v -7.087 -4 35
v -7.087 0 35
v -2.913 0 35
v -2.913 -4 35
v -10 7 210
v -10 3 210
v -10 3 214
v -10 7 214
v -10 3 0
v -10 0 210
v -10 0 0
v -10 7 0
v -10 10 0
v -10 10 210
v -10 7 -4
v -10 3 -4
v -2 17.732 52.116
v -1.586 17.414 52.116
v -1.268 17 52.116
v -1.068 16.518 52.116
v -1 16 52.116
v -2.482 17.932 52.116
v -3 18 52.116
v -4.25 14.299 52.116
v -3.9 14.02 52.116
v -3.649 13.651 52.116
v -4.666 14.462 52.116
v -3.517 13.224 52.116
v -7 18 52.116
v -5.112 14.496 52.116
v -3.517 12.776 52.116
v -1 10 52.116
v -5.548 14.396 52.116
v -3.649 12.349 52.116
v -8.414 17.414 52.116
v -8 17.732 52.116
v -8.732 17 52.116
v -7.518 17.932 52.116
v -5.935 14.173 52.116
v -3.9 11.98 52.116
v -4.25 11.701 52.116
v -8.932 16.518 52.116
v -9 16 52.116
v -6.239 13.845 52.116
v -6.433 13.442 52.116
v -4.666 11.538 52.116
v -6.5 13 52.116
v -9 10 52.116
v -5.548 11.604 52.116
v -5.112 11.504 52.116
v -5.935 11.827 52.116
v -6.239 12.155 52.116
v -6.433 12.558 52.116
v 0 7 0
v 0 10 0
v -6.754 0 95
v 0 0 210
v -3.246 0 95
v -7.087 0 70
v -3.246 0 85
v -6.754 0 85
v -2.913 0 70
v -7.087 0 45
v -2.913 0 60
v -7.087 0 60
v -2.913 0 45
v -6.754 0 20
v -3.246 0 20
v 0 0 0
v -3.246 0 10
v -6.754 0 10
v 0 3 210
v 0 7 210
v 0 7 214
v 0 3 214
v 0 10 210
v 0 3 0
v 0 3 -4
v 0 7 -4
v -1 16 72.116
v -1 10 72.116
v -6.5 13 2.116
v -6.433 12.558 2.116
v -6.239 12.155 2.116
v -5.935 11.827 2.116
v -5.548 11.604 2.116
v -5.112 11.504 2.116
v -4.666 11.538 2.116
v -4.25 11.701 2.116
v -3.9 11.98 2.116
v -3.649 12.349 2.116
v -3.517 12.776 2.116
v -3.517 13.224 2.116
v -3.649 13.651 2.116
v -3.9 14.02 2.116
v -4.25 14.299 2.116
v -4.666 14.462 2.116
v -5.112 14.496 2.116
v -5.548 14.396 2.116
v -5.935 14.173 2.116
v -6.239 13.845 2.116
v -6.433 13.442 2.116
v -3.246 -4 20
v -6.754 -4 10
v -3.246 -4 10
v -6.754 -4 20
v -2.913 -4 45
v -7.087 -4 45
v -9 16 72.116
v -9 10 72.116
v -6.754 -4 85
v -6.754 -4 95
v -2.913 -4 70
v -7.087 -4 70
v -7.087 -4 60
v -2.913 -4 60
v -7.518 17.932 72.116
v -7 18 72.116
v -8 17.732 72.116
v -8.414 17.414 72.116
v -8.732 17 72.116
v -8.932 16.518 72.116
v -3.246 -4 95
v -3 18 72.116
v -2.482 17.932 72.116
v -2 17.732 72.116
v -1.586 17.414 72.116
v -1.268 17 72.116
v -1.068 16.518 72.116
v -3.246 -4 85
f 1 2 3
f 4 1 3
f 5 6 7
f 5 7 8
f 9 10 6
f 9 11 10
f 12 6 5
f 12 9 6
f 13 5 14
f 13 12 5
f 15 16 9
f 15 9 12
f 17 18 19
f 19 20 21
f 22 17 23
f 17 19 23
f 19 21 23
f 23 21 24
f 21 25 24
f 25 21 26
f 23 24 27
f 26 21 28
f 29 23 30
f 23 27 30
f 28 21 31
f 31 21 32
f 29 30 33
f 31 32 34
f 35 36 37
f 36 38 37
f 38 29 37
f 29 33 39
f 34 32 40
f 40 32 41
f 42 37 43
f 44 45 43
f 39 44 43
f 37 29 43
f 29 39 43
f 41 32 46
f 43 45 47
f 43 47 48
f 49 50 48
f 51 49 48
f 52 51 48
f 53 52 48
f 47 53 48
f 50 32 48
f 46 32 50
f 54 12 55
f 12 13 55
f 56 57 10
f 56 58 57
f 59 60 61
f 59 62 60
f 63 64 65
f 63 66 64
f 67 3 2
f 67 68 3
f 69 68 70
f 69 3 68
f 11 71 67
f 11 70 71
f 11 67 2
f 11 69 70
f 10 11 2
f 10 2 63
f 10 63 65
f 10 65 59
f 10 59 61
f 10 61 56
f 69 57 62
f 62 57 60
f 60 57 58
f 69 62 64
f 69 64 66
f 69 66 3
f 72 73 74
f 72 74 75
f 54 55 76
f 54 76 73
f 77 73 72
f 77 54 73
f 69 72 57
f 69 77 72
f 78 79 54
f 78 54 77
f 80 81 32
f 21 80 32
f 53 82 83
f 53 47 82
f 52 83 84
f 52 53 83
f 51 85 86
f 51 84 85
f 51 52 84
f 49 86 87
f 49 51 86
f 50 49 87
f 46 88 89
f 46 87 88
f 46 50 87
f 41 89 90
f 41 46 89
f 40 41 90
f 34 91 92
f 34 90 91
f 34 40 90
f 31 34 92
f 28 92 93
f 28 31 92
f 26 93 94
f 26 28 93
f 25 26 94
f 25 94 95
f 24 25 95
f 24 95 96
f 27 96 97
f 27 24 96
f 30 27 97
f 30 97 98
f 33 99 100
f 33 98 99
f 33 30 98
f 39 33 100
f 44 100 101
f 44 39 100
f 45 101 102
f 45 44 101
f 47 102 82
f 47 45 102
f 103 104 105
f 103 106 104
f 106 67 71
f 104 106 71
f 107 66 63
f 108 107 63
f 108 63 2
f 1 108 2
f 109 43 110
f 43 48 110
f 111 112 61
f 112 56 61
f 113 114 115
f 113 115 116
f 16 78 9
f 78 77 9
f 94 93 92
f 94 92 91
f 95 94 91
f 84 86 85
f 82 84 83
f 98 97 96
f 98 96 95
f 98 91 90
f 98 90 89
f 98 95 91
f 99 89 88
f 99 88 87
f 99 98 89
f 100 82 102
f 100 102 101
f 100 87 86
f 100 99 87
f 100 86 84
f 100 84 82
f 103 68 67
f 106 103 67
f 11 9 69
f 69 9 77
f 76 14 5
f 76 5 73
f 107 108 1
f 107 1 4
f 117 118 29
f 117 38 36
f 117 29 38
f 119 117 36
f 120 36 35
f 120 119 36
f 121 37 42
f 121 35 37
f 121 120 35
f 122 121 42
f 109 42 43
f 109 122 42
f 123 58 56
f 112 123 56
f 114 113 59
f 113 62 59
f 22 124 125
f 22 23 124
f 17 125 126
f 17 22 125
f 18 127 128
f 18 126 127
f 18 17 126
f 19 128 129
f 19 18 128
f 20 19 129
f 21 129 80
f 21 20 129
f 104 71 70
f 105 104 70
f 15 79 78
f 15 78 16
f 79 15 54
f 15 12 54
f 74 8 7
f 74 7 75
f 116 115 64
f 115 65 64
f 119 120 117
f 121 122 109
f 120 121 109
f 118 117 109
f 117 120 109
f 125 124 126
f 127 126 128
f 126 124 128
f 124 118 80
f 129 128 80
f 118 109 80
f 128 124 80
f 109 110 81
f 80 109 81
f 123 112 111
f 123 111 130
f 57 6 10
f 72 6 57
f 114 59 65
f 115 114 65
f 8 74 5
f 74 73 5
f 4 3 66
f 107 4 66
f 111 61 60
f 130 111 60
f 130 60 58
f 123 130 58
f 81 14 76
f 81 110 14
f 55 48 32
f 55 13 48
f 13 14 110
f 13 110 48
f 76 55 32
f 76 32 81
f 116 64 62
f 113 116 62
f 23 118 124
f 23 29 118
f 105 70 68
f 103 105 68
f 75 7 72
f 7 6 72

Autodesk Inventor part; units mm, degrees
ref_plane "YZ Plane" through (0, 0, 0) normal (1, 0, 0) x (0, 1, 0)
ref_plane "XZ Plane" through (0, 0, 0) normal (0, 1, 0) x (-1, 0, 0)
ref_plane "XY Plane" through (0, 0, 0) normal (0, 0, 1) x (1, 0, 0)
sketch "Эскиз1" plane through (0, 0, 0) normal (0, 0, 1) x (1, 0, 0)
  line L0 (0, 0) -> (-10, 0)
  line L1 (-10, 0) -> (-10, 10)
  line L2 (-10, 10) -> (0, 10)
  line L3 (0, 10) -> (0, 0)
  dimension "d0" = 10
  dimension "d1" = 10
extrude "Выдавливание1" add sketch "Эскиз1" along normal blind 210
sketch "Эскиз2" plane through (0, 0, 210) normal (0, 0, 1) x (1, 0, 0)
  line L0 (-10, 10) -> (-10, 0) projected
  line L1 (0, 0) -> (0, 10) projected
  line L2 (-10, 3) -> (0, 3)
  line L3 (0, 3) -> (0, 7)
  line L4 (0, 7) -> (-10, 7)
  line L5 (-10, 7) -> (-10, 3)
  line L6 (-10, 5) -> (0, 5)
  point P0 (0, 3)
  dimension "d4" = 4
extrude "Выдавливание2" add sketch "Эскиз2" along normal blind 4
sketch "Эскиз3" plane through (0, 0, 0) normal (0, 0, -1) x (-1, 0, 0)
  line L0 (10, 7) -> (10, 3) projected
  line L1 (0, 0) -> (0, 3) projected
  line L2 (10, 7) -> (0, 7)
  line L3 (0, 7) -> (0, 3)
  line L4 (0, 3) -> (10, 3)
  line L5 (10, 3) -> (10, 7)
extrude "Выдавливание3" add sketch "Эскиз3" along normal blind 4
sketch "Эскиз4" plane through (-10, 0, 0) normal (0, -1, 0) x (1, 0, 0)
  line L0 (10, 0) -> (10, 210) projected
  line L1 (10, 105) -> (0, 105)
  line L2 (0, 0) -> (0, 210) projected
  line L3 (5, 105) -> (5, 0)
  line L4 (0, 0) -> (10, 0) projected
  line L5 (6.7537, 95) -> (3.2463, 95)
  line L6 (3.2463, 95) -> (3.2463, 85)
  line L7 (3.2463, 85) -> (6.7537, 85)
  line L8 (6.7537, 85) -> (6.7537, 95)
  line L9 (7.0866, 70) -> (2.9134, 70)
  line L10 (2.9134, 70) -> (2.9134, 60)
  line L11 (2.9134, 60) -> (7.0866, 60)
  line L12 (7.0866, 60) -> (7.0866, 70)
  line L13 (7.0866, 45) -> (2.9134, 45)
  line L14 (2.9134, 45) -> (2.9134, 35)
  line L15 (2.9134, 35) -> (7.0866, 35)
  line L16 (7.0866, 35) -> (7.0866, 45)
  line L17 (6.7537, 20) -> (3.2463, 20)
  line L18 (3.2463, 20) -> (3.2463, 10)
  line L19 (3.2463, 10) -> (6.7537, 10)
  line L20 (6.7537, 10) -> (6.7537, 20)
  dimension "d9" = 10
  dimension "d10" = 10
  dimension "d11" = 10
  dimension "d12" = 10
  dimension "d13" = 10
  dimension "d14" = 15
  dimension "d15" = 15
  dimension "d16" = 15
extrude "Выдавливание4" add sketch "Эскиз4" along normal blind 4 contours L19 L18 L17 L3 | L3 L17 L20 L19 | L5 L8 L7 L3 | L3 L7 L6 L5 | L15 L14 L13 L3 | L3 L13 L16 L15 | L9 L12 L11 L3 | L3 L11 L10 L9
sketch "Эскиз5" plane through (-10, 10, 0) normal (0, 1, 0) x (1, 0, 0)
  line L0 (9, -52.1164) -> (1, -52.1164)
  line L1 (1, -52.1164) -> (1, -72.1164)
  line L2 (1, -72.1164) -> (9, -72.1164)
  line L3 (9, -72.1164) -> (9, -52.1164)
  point P0 (10, 0)
  point P1 (10, -52.1164)
  dimension "d19" = 8
  dimension "d20" = 20
  dimension "d21" = 1
extrude "Выдавливание5" add sketch "Эскиз5" along normal blind 8
fillet "Сопряжение1" radius 2 2 edges at (-1, 18, 62.1164) (-9, 18, 62.1164)
sketch "Эскиз6" plane through (-1, 10, 52.1164) normal (0, 0, -1) x (-1, 0, 0)
  line L0 (2, 8) -> (6, 8) projected
  line L1 (8, 0) -> (8, 6) projected
  circle A0 centre (4, 3) radius 1.5
  point P0 (-1, -10)
  point P1 (4, 8)
  point P2 (8, 3)
  dimension "d25" = 3
extrude "Выдавливание6" add sketch "Эскиз6" along normal blind 50
properties part number "центр пушки"
